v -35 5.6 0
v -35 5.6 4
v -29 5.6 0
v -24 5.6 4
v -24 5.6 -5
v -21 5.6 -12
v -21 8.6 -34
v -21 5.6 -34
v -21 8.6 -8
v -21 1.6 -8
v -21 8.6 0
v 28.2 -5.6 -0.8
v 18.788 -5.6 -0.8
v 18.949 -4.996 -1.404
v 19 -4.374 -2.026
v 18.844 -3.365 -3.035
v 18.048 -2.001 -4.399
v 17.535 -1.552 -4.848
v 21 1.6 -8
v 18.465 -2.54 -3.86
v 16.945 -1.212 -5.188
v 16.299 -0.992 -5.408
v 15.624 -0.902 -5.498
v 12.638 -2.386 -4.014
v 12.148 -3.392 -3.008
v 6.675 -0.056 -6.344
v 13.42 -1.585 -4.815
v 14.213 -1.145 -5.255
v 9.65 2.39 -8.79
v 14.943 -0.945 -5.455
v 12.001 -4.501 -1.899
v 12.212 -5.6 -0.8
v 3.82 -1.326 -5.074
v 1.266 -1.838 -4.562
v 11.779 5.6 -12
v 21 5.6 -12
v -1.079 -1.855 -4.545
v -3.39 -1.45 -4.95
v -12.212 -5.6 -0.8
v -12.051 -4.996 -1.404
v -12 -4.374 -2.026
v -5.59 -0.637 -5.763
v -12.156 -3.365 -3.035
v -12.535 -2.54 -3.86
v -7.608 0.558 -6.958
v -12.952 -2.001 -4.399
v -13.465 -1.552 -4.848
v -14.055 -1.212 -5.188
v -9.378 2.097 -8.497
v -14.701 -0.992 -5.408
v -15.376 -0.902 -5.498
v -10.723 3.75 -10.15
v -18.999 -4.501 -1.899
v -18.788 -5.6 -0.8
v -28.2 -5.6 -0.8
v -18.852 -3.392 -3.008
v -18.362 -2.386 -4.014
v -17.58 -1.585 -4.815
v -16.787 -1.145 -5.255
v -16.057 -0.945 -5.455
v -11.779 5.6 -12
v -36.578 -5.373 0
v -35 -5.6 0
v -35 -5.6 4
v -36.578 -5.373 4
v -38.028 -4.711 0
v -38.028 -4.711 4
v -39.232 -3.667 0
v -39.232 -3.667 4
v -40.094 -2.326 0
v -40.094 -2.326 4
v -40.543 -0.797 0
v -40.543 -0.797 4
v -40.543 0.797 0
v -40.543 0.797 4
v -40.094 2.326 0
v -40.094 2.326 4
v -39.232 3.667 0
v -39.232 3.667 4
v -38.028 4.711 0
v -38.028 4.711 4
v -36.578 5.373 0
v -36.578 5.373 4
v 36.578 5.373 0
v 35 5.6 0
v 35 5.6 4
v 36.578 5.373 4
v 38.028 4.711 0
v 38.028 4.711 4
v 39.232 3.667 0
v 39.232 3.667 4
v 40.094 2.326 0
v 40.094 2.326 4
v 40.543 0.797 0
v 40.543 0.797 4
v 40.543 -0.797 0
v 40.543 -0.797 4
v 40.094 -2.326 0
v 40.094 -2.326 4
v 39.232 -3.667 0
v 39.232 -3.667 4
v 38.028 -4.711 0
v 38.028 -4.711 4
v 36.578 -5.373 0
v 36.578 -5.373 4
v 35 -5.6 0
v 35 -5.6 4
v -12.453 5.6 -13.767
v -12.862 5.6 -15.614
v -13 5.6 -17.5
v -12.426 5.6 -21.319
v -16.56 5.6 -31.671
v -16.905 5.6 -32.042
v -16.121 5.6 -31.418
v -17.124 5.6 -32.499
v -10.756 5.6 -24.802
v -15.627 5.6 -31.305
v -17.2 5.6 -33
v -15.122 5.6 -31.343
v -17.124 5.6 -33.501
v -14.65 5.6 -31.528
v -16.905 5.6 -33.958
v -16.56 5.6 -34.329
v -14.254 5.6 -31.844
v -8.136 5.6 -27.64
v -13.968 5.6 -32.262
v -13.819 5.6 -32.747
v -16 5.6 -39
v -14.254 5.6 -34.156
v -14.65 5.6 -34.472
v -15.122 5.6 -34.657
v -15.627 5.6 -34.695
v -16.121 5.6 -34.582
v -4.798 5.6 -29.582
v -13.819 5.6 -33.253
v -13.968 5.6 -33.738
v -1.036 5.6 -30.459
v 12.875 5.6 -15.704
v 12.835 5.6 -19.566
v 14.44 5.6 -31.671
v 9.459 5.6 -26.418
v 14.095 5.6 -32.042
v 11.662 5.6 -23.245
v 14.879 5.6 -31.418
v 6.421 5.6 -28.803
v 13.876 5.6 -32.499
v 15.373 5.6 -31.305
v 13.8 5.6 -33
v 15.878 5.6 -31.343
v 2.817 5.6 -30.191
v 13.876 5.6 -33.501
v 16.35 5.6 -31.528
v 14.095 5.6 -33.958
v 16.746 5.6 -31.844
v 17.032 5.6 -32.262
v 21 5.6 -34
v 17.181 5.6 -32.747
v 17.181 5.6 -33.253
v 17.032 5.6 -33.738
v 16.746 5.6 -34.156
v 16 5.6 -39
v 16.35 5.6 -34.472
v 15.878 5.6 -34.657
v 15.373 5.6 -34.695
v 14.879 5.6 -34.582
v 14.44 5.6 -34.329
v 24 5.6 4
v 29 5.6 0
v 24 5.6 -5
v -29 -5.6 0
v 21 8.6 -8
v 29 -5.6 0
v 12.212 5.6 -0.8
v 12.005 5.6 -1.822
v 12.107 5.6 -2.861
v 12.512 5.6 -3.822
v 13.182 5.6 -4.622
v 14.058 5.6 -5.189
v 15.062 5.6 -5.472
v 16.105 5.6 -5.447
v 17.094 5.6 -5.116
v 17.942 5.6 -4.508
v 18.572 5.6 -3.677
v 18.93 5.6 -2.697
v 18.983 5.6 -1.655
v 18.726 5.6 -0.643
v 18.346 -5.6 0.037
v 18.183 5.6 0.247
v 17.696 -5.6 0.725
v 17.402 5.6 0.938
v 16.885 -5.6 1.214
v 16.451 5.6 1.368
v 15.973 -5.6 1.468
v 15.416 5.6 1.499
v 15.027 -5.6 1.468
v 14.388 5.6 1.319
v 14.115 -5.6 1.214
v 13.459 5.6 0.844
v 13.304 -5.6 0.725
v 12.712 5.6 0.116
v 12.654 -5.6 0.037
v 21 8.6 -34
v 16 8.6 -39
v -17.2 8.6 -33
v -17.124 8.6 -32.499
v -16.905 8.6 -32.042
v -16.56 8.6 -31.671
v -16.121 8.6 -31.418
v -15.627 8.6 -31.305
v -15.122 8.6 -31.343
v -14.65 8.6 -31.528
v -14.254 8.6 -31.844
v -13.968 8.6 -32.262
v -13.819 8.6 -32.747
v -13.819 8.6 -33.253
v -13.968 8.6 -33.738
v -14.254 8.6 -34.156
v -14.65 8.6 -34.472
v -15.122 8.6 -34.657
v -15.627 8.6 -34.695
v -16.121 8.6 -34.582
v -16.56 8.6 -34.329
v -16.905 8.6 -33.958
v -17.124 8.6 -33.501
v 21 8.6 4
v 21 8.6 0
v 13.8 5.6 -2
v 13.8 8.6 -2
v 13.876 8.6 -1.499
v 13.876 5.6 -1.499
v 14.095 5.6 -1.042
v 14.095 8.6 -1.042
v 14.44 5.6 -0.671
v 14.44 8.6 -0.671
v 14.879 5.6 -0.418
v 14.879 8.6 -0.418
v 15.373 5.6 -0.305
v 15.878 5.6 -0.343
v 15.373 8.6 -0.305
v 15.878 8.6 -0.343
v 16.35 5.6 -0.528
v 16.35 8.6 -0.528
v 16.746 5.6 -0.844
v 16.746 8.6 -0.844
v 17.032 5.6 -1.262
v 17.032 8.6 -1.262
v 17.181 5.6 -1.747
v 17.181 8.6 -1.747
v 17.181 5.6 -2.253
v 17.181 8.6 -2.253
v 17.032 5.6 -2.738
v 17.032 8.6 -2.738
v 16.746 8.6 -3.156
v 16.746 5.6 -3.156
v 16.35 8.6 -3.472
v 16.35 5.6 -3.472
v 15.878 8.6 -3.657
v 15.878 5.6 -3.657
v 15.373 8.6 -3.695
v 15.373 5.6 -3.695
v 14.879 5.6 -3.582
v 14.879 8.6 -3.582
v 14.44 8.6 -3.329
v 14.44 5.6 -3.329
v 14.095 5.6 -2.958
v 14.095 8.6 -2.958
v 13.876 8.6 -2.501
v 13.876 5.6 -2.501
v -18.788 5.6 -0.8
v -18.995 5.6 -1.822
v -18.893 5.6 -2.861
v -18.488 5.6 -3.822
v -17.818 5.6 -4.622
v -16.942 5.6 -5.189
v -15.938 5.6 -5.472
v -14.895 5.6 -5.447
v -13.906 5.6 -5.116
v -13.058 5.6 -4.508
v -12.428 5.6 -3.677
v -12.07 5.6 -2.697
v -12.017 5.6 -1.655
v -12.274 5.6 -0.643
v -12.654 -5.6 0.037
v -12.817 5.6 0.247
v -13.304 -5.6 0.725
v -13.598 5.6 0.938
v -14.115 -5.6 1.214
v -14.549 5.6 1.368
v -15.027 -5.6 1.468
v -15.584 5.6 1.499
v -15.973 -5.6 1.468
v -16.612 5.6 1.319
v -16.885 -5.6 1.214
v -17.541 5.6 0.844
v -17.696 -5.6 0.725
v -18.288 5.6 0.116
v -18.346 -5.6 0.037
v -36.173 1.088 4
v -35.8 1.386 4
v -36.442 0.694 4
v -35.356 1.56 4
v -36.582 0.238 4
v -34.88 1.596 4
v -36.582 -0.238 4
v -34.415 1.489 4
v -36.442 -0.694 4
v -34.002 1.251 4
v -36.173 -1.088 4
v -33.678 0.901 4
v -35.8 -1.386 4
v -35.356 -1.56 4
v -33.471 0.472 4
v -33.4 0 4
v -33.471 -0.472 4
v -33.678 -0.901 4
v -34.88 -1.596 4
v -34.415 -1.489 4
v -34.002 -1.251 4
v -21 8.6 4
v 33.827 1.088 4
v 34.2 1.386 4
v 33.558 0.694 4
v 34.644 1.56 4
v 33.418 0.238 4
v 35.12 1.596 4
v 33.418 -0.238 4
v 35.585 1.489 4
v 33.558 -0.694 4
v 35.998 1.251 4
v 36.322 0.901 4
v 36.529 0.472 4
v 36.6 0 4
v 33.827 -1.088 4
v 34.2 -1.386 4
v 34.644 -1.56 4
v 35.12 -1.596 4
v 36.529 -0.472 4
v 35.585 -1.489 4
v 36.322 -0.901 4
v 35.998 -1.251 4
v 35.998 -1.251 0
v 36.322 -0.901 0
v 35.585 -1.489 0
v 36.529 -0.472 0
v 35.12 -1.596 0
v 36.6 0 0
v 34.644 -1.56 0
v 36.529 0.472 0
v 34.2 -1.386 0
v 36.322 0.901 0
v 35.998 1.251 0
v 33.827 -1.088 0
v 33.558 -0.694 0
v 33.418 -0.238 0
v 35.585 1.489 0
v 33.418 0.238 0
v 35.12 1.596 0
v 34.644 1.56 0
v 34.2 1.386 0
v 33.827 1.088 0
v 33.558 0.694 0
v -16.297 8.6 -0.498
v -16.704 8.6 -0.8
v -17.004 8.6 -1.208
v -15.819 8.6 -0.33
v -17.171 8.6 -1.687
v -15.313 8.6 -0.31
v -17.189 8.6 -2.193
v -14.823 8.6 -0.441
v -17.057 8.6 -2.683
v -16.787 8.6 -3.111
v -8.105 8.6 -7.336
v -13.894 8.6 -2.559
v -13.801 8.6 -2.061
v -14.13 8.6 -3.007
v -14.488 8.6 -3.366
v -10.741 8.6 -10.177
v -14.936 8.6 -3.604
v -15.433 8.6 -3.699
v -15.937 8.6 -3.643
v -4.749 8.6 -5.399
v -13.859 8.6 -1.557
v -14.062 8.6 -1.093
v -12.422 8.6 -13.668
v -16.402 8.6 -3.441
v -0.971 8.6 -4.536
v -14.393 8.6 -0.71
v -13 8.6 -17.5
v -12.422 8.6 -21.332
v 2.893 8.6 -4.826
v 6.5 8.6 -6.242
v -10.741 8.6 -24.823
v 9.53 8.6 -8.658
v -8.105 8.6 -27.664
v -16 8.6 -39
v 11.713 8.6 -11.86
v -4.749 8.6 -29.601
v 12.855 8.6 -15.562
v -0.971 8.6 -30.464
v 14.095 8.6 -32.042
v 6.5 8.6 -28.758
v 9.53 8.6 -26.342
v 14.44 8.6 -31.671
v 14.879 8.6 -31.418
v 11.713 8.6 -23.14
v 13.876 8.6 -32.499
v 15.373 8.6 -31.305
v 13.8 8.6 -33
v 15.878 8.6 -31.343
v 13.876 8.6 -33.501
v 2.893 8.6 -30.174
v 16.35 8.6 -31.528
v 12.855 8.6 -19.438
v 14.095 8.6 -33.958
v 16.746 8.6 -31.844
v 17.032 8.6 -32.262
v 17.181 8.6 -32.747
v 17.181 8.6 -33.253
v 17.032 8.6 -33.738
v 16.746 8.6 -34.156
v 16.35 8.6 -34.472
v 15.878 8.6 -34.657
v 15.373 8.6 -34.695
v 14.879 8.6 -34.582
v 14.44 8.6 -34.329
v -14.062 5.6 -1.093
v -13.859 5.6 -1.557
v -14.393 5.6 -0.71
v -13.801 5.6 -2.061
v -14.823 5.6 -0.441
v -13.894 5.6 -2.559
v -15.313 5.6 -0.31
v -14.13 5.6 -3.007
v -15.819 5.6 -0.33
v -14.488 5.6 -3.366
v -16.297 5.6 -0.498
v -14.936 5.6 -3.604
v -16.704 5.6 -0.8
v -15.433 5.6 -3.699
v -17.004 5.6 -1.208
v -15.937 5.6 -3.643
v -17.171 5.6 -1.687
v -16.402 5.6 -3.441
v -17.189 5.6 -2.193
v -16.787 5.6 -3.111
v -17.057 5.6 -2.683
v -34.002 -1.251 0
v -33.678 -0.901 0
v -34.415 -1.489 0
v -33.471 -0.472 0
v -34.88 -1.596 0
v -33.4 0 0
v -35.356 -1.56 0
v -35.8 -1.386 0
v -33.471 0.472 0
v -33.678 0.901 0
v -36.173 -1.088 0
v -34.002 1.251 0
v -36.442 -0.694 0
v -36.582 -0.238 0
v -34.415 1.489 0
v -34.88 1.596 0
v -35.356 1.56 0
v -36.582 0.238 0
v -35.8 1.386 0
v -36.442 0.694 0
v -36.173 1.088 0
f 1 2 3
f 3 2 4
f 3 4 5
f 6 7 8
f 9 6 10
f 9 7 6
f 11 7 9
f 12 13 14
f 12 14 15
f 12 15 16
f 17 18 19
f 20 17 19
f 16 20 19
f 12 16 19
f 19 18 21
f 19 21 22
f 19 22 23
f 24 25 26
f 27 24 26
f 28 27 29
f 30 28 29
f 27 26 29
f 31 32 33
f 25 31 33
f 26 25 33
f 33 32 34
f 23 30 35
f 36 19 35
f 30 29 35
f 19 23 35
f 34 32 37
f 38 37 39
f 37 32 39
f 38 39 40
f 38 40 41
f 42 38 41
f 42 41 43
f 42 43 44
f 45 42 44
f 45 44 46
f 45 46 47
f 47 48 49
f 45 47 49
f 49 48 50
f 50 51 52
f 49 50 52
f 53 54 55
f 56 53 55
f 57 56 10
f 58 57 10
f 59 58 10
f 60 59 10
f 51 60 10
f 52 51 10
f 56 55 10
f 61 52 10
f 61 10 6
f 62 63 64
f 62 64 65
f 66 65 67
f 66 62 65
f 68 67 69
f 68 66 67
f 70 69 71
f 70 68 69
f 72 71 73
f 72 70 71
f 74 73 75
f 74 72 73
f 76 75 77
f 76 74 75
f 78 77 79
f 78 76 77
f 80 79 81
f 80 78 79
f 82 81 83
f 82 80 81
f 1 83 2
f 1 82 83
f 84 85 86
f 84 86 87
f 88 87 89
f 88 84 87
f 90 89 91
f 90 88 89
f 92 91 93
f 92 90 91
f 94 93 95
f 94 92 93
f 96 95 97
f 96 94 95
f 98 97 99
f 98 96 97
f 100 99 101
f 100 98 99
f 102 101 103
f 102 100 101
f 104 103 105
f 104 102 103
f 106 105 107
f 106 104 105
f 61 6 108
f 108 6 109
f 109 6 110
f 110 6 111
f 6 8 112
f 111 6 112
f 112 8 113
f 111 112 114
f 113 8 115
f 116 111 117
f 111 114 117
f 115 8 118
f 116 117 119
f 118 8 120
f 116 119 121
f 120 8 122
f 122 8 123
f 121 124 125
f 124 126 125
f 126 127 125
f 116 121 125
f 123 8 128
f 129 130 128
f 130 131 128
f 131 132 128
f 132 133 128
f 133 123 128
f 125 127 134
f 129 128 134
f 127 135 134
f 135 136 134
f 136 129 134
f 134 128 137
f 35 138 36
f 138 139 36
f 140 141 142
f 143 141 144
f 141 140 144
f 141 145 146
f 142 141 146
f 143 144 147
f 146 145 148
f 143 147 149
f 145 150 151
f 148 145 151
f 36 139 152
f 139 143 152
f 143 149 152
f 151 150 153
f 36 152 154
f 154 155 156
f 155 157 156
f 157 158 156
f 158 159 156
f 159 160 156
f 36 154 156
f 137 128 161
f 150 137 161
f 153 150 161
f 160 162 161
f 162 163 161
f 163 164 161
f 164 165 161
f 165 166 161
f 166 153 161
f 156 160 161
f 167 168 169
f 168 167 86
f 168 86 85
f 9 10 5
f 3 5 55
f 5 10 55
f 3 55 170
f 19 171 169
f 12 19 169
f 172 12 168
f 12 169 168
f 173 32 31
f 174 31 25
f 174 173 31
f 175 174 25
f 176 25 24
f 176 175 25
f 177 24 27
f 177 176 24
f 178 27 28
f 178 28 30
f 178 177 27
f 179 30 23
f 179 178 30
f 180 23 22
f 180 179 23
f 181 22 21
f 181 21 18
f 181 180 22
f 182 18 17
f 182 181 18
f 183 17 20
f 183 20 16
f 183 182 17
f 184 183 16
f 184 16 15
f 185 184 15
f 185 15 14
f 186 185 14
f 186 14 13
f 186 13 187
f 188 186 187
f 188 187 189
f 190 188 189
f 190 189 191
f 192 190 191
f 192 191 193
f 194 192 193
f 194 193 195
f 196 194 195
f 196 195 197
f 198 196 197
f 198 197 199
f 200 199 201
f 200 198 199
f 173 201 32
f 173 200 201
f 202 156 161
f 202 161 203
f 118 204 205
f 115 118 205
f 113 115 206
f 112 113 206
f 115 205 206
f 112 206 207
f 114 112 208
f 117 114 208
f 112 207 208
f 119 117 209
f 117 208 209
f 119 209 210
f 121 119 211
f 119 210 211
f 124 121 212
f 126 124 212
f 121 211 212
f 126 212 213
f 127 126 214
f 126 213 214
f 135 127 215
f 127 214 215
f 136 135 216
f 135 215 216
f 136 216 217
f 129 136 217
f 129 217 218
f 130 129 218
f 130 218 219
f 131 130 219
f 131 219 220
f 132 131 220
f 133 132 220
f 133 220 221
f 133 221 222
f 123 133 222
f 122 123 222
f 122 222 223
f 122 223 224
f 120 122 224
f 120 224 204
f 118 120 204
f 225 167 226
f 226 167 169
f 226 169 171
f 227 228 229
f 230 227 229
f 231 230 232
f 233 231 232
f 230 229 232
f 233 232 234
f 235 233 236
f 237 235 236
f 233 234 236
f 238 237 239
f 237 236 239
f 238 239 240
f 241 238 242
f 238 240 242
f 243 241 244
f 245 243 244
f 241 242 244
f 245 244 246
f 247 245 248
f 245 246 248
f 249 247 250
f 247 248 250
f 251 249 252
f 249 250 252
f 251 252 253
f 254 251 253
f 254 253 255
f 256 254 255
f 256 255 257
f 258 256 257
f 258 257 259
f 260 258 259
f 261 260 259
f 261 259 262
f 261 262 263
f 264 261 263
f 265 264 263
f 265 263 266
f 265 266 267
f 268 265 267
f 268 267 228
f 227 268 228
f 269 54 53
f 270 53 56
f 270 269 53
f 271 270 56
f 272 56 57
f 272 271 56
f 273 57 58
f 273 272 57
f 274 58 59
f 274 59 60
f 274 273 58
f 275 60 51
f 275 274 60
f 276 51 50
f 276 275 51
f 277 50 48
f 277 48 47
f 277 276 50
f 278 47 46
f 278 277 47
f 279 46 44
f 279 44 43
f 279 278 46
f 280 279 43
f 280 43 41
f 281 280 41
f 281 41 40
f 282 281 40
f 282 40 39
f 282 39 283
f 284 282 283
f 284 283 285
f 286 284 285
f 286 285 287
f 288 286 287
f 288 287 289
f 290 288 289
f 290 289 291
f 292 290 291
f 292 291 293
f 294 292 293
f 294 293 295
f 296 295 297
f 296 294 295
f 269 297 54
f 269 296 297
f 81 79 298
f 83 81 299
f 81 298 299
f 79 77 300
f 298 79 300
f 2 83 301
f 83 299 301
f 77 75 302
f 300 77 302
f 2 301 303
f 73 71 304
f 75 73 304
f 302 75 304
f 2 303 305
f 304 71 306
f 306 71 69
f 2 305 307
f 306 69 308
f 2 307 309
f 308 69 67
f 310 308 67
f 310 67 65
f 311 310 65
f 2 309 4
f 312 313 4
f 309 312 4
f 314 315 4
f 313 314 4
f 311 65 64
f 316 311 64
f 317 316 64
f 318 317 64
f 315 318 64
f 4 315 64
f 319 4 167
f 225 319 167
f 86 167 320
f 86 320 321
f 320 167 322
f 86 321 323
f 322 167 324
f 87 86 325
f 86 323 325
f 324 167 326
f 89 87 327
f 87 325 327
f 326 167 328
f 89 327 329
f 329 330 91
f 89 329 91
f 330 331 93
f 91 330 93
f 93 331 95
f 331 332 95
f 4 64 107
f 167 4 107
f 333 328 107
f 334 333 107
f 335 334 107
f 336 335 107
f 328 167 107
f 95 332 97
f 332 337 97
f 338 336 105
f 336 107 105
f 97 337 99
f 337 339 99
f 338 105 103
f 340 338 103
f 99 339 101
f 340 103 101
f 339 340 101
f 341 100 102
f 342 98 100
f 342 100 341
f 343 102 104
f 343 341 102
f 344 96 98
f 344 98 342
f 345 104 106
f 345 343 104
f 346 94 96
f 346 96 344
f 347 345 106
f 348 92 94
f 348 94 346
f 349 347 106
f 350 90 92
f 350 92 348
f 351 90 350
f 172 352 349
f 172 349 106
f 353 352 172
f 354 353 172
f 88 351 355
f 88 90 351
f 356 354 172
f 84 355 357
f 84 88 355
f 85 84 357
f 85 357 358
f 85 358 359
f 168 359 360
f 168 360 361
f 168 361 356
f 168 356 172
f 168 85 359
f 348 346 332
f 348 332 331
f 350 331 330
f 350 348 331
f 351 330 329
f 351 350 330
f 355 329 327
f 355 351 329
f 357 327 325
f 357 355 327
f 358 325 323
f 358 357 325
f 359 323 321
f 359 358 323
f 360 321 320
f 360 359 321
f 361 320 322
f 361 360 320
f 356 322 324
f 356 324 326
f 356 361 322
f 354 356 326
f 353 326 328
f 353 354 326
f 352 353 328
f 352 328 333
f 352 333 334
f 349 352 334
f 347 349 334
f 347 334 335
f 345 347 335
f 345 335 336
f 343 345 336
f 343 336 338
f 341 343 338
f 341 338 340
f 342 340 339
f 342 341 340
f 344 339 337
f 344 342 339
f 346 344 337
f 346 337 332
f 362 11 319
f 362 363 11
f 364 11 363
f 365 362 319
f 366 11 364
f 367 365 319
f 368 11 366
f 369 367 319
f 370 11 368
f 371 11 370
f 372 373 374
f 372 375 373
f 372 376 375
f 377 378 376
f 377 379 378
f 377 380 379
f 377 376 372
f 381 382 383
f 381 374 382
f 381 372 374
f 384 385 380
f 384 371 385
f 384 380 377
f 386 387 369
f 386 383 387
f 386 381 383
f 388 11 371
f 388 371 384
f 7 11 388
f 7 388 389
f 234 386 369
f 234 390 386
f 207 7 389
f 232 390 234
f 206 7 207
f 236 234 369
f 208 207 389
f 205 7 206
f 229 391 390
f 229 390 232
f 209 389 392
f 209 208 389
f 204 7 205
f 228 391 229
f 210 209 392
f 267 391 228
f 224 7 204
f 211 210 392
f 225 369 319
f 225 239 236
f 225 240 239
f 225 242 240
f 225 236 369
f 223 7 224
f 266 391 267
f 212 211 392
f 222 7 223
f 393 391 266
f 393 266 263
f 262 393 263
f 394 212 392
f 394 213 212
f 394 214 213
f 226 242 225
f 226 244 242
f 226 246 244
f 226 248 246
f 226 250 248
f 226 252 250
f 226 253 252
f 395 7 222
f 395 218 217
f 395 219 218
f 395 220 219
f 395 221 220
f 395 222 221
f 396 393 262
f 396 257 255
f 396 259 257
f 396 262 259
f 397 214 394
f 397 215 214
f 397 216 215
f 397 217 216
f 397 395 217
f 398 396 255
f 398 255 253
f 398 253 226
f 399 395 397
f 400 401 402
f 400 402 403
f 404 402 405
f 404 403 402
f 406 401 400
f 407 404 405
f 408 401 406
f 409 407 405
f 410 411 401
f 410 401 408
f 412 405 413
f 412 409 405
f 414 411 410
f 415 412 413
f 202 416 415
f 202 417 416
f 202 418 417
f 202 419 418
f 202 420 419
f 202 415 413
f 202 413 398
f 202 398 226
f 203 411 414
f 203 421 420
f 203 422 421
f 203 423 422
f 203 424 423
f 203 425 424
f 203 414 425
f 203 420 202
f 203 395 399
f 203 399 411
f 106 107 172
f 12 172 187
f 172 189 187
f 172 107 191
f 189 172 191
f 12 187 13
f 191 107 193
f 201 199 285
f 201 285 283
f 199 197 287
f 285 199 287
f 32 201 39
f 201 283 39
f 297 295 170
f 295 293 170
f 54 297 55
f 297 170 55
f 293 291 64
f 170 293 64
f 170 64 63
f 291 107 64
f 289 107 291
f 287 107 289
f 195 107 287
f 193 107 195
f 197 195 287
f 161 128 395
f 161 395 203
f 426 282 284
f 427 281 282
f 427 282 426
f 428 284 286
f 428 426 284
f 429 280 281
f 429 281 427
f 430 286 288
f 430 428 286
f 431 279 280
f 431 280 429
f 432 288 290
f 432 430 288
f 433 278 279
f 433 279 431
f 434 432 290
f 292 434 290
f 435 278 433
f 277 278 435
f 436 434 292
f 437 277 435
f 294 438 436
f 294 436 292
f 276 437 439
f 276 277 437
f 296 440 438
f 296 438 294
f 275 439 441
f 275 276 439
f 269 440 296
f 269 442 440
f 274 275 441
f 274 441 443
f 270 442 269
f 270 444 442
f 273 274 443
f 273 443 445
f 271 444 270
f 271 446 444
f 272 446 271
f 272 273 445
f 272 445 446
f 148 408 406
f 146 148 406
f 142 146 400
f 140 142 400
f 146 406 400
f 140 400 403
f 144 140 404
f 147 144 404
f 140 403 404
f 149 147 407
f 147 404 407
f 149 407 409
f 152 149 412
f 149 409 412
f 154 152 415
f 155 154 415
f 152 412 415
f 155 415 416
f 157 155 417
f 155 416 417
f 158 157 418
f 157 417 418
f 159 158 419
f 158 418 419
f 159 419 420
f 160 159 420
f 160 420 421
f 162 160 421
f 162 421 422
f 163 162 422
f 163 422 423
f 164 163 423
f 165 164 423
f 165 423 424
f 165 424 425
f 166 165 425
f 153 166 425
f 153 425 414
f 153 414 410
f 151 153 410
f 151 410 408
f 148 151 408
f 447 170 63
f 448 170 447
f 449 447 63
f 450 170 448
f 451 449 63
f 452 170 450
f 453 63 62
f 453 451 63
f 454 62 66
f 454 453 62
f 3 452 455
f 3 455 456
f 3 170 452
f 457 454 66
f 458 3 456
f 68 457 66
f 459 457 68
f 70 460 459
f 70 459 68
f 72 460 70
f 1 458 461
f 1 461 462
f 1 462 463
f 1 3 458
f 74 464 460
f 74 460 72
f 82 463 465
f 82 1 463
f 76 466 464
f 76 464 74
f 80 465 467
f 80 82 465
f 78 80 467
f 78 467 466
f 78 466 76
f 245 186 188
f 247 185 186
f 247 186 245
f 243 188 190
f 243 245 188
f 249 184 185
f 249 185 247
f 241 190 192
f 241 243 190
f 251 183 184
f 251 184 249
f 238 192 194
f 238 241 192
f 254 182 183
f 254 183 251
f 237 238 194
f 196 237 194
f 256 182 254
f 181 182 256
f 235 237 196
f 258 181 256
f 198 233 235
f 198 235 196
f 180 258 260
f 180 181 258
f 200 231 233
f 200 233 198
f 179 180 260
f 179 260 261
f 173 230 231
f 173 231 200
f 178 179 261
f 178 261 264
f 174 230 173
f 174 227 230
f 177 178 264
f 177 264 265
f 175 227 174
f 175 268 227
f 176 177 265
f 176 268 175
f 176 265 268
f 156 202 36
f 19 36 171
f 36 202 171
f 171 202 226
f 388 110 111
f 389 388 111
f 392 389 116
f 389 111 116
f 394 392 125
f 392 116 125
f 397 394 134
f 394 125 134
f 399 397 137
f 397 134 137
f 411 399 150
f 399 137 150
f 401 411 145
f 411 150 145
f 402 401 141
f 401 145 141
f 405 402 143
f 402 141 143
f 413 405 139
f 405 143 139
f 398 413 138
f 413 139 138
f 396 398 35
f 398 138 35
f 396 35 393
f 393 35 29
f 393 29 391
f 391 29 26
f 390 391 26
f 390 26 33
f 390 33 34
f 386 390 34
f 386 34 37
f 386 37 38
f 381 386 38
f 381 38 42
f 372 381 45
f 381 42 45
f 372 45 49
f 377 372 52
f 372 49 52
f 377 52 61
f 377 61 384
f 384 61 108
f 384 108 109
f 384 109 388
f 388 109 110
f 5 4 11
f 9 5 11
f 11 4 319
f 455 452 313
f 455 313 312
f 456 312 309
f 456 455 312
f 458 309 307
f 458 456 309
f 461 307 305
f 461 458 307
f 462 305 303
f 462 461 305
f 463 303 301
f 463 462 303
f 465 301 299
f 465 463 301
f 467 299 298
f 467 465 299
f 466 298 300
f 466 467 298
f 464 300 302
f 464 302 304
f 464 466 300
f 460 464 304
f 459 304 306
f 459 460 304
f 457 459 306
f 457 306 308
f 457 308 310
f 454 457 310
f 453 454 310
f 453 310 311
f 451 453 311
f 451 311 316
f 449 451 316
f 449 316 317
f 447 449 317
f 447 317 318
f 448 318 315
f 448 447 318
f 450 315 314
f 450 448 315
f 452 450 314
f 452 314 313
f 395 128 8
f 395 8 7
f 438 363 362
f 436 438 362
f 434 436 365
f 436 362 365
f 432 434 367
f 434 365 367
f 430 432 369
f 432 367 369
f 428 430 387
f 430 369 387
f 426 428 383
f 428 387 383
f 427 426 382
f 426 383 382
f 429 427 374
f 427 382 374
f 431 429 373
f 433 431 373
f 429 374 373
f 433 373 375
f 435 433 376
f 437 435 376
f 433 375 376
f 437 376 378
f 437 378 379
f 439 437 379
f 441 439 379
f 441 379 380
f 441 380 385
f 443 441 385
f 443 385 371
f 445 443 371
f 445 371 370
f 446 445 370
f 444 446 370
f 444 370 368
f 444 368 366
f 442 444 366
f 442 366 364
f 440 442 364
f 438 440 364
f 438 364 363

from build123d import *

# Parameters (mm, degrees)
ESBO_O1_R                = 1.6
RESSALTO_EXTRUS_O1_DEPTH = 4
ESBO_O2_W                = 42
ESBO_O2_H                = 43
ESBO_O2_R                = 13
RESSALTO_EXTRUS_O2_DEPTH = 3
CHANFRO1_SIZE            = 3
CHANFRO2_SIZE            = 5
CHANFRO3_SIZE            = 12
ESBO_O3_R                = 1.7
CORTE_EXTRUS_O1_DEPTH    = 59.060313468
ESBO_O4_R                = 3.5
CORTE_EXTRUS_O2_DEPTH    = 58.400348431
CHANFRO4_SIZE            = 8


# Some blends are built 0.0001 mm under size
with BuildPart() as part:
    # Esboço1 → Ressalto-extrusão1 (new body)
    with BuildSketch(Plane.XY):
        with BuildLine():
            Line((-35, 5.6), (35, 5.6))
            ThreePointArc((35, 5.6), (40.6, 0), (35, -5.6))
            Line((35, -5.6), (-35, -5.6))
            ThreePointArc((-35, -5.6), (-40.6, 0), (-35, 5.6))
        make_face()
        with Locations((35, 0)):
            Circle(ESBO_O1_R, mode=Mode.SUBTRACT)
        with Locations((-35, 0)):
            Circle(ESBO_O1_R, mode=Mode.SUBTRACT)
    extrude(amount=RESSALTO_EXTRUS_O1_DEPTH)

    # Esboço2 → Ressalto-extrusão2 (add)
    with BuildSketch(Plane(origin=(0, 5.6, 0), x_dir=(1, 0, 0), z_dir=(0, 1, 0))):
        with Locations((0, 17.5)):
            Rectangle(ESBO_O2_W, ESBO_O2_H)
        with Locations(Location((0, 17.5, 0), (0, 0, 180))):
            Circle(ESBO_O2_R, mode=Mode.SUBTRACT)
    extrude(amount=RESSALTO_EXTRUS_O2_DEPTH)

    # Chanfro1
    chanfro1_edges = [part.edges().sort_by_distance(p)[0] for p in [
        (21, 5.6, 2),
        (-21, 5.6, 2),
    ]]
    chamfer(chanfro1_edges, length=CHANFRO1_SIZE - 0.0001)  # a hair under: the kernel refuses the full size

    # Chanfro2
    chanfro2_edges = [part.edges().sort_by_distance(p)[0] for p in [
        (21, 7.1, -39),
        (-21, 7.1, -39),
    ]]
    chamfer(chanfro2_edges, length=CHANFRO2_SIZE)

    # Chanfro3
    # the kernel refuses this chamfer: 12 mm, written as the material it adds along each edge
    with BuildSketch(Plane(origin=(-21, 5.6, 0), x_dir=(0, 0.027495876610586417, -0.9996219169112968), z_dir=(1, 0, 0))) as chanfro3_piece_1_section:
        Polygon((CHANFRO3_SIZE * 0.999621916911, -CHANFRO3_SIZE * 0.0274958766106), (-CHANFRO3_SIZE * 0.0274958766106, -CHANFRO3_SIZE * 0.999621916911), (0, 0), align=None)
    chanfro3_piece_1 = extrude(amount=42, mode=Mode.PRIVATE)
    chanfro3_piece_1 = chanfro3_piece_1 - Plane(origin=(0, 1.3654596, -17.5), x_dir=(-1, 0, 0), z_dir=(0, -1, 0)) * Cylinder(13, 132, mode=Mode.PRIVATE)
    chanfro3_piece_1 = split(chanfro3_piece_1, bisect_by=Plane(origin=(0, -5.6, -3.473436689), z_dir=(0, 1, 0)), keep=Keep.TOP, mode=Mode.PRIVATE)
    add(chanfro3_piece_1)

    # Esboço3 → Corte-extrusão1 (cut, through all)
    with BuildSketch(Plane(origin=(0, 8.6, 0), x_dir=(1, 0, 0), z_dir=(0, 1, 0))):
        with Locations(Location((-15.5, 33, 0), (0, 0, 180))):
            Circle(ESBO_O3_R)
        with Locations(Location((15.5, 33, 0), (0, 0, 180))):
            Circle(ESBO_O3_R)
        with Locations(Location((15.5, 2, 0), (0, 0, 180))):
            Circle(ESBO_O3_R)
        with Locations(Location((-15.5, 2, 0), (0, 0, 224.900872156))):
            Circle(ESBO_O3_R)
    extrude(amount=-CORTE_EXTRUS_O1_DEPTH, mode=Mode.SUBTRACT)

    # Esboço4 → Corte-extrusão2 (cut, through all)
    with BuildSketch(Plane.XZ.offset(-5.6)):
        with Locations(Location((-15.5, -2, 0), (0, 0, 159.948957433))):
            Circle(ESBO_O4_R)
        with Locations(Location((15.5, -2, 0), (0, 0, 159.948957433))):
            Circle(ESBO_O4_R)
        with Locations((15.5, -33)):
            Circle(ESBO_O4_R)
        with Locations((-15.5, -33)):
            Circle(ESBO_O4_R)
    extrude(amount=CORTE_EXTRUS_O2_DEPTH, mode=Mode.SUBTRACT)

    # Chanfro4
    # the kernel refuses this chamfer: 8 mm, written as the material it adds along each edge
    with BuildSketch(Plane(origin=(21, 29.173363904, 0), x_dir=(-0.027495876610586494, 3.1525903256593395e-13, -0.9996219169112968), z_dir=(0, -1, 0))) as chanfro4_piece_1_section:
        Polygon((CHANFRO4_SIZE * 0.999621916911, CHANFRO4_SIZE * 0.0274958766106), (-CHANFRO4_SIZE * 0.0274958766106, CHANFRO4_SIZE * 0.999621916911), (0, 0), align=None)
    chanfro4_piece_1 = extrude(amount=34.773363904, mode=Mode.PRIVATE)
    chanfro4_piece_1 = split(chanfro4_piece_1, bisect_by=Plane(origin=(26.011530684, 3.588369316, -1.04435595), z_dir=(0.7071067811865474, 0.7071067811865478, 0)), keep=Keep.TOP, mode=Mode.PRIVATE)
    chanfro4_piece_1 = split(chanfro4_piece_1, bisect_by=Plane(origin=(26.682074245, 5.6, -1.04435595), z_dir=(0, -1, 0)), keep=Keep.TOP, mode=Mode.PRIVATE)
    add(chanfro4_piece_1)
    with BuildSketch(Plane(origin=(21, 29.173363904, 0), x_dir=(-0.027495876610586494, 3.1525903256593395e-13, -0.9996219169112968), z_dir=(0, -1, 0))) as chanfro4_piece_2_section:
        Polygon((CHANFRO4_SIZE * 0.999621916911, CHANFRO4_SIZE * 0.0274958766106), (-CHANFRO4_SIZE * 0.0274958766106, CHANFRO4_SIZE * 0.999621916911), (0, 0), align=None)
    chanfro4_piece_2 = extrude(amount=34.773363904, mode=Mode.PRIVATE)
    chanfro4_piece_2 = split(chanfro4_piece_2, bisect_by=Plane(origin=(22.348256975, 7.251643025, -3.639481653), z_dir=(-0.7071067811865474, -0.7071067811865478, 0)), keep=Keep.TOP, mode=Mode.PRIVATE)
    chanfro4_piece_2 = split(chanfro4_piece_2, bisect_by=Plane(origin=(21.792799579, 8.6, -3.639481653), z_dir=(0, -1, 0)), keep=Keep.TOP, mode=Mode.PRIVATE)
    chanfro4_piece_2 = split(chanfro4_piece_2, bisect_by=Plane(origin=(21.792799579, 5.6, -3.639481653), z_dir=(0, 1, 0)), keep=Keep.TOP, mode=Mode.PRIVATE)
    add(chanfro4_piece_2)
    with BuildSketch(Plane(origin=(21, 29.173363904, 0), x_dir=(-0.027495876610586494, 3.1525903256593395e-13, -0.9996219169112968), z_dir=(0, -1, 0))) as chanfro4_piece_3_section:
        Polygon((CHANFRO4_SIZE * 0.999621916911, CHANFRO4_SIZE * 0.0274958766106), (-CHANFRO4_SIZE * 0.0274958766106, CHANFRO4_SIZE * 0.999621916911), (0, 0), align=None)
    chanfro4_piece_3 = extrude(amount=34.773363904, mode=Mode.PRIVATE)
    chanfro4_piece_3 = split(chanfro4_piece_3, bisect_by=Plane(origin=(23.6247191, -1.786159604, -4.613840396), z_dir=(0, 0.7071067811862648, 0.7071067811868302)), keep=Keep.TOP, mode=Mode.PRIVATE)
    chanfro4_piece_3 = split(chanfro4_piece_3, bisect_by=Plane(origin=(26.361426714, 3.238473286, -2.325915119), z_dir=(-0.7071067811865474, -0.7071067811865478, 0)), keep=Keep.TOP, mode=Mode.PRIVATE)
    chanfro4_piece_3 = split(chanfro4_piece_3, bisect_by=Plane(origin=(23.6247191, 5.6, -2.325915119), z_dir=(0, -1, 0)), keep=Keep.TOP, mode=Mode.PRIVATE)
    add(chanfro4_piece_3)
    with BuildSketch(Plane(origin=(-21, -5.6, 0), x_dir=(0.027495876610578507, 3.1525903256593415e-13, -0.999621916911297), z_dir=(0, 1, 0))) as chanfro4_piece_4_section:
        Polygon((CHANFRO4_SIZE * 0.999621916911, CHANFRO4_SIZE * 0.0274958766106), (-CHANFRO4_SIZE * 0.0274958766111, CHANFRO4_SIZE * 0.999621916911), (0, 0), align=None)
    chanfro4_piece_4 = extrude(amount=34.773363904, mode=Mode.PRIVATE)
    chanfro4_piece_4 = split(chanfro4_piece_4, bisect_by=Plane(origin=(-23.6247191, -1.786159604, -4.613840396), z_dir=(0, 0.7071067811862648, 0.7071067811868302)), keep=Keep.TOP, mode=Mode.PRIVATE)
    chanfro4_piece_4 = split(chanfro4_piece_4, bisect_by=Plane(origin=(-26.361426714, 3.238473286, -2.325915119), z_dir=(0.7071067811865477, -0.7071067811865475, 0)), keep=Keep.TOP, mode=Mode.PRIVATE)
    chanfro4_piece_4 = split(chanfro4_piece_4, bisect_by=Plane(origin=(-23.6247191, 5.6, -2.325915119), z_dir=(0, -1, 0)), keep=Keep.TOP, mode=Mode.PRIVATE)
    add(chanfro4_piece_4)
    with BuildSketch(Plane(origin=(-21, -5.6, 0), x_dir=(0.027495876610578507, 3.1525903256593415e-13, -0.999621916911297), z_dir=(0, 1, 0))) as chanfro4_piece_5_section:
        Polygon((CHANFRO4_SIZE * 0.999621916911, CHANFRO4_SIZE * 0.0274958766106), (-CHANFRO4_SIZE * 0.0274958766111, CHANFRO4_SIZE * 0.999621916911), (0, 0), align=None)
    chanfro4_piece_5 = extrude(amount=34.773363904, mode=Mode.PRIVATE)
    chanfro4_piece_5 = split(chanfro4_piece_5, bisect_by=Plane(origin=(-26.011530684, 3.588369316, -1.04435595), z_dir=(-0.7071067811865477, 0.7071067811865475, 0)), keep=Keep.TOP, mode=Mode.PRIVATE)
    chanfro4_piece_5 = split(chanfro4_piece_5, bisect_by=Plane(origin=(-26.682074245, 5.6, -1.04435595), z_dir=(0, -1, 0)), keep=Keep.TOP, mode=Mode.PRIVATE)
    add(chanfro4_piece_5)
    with BuildSketch(Plane(origin=(-21, -5.6, 0), x_dir=(0.027495876610578507, 3.1525903256593415e-13, -0.999621916911297), z_dir=(0, 1, 0))) as chanfro4_piece_6_section:
        Polygon((CHANFRO4_SIZE * 0.999621916911, CHANFRO4_SIZE * 0.0274958766106), (-CHANFRO4_SIZE * 0.0274958766111, CHANFRO4_SIZE * 0.999621916911), (0, 0), align=None)
    chanfro4_piece_6 = extrude(amount=34.773363904, mode=Mode.PRIVATE)
    chanfro4_piece_6 = split(chanfro4_piece_6, bisect_by=Plane(origin=(-22.348256975, 7.251643025, -3.639481653), z_dir=(0.7071067811865477, -0.7071067811865475, 0)), keep=Keep.TOP, mode=Mode.PRIVATE)
    chanfro4_piece_6 = split(chanfro4_piece_6, bisect_by=Plane(origin=(-21.792799579, 8.6, -3.639481653), z_dir=(0, -1, 0)), keep=Keep.TOP, mode=Mode.PRIVATE)
    chanfro4_piece_6 = split(chanfro4_piece_6, bisect_by=Plane(origin=(-21.792799579, 5.6, -3.639481653), z_dir=(0, 1, 0)), keep=Keep.TOP, mode=Mode.PRIVATE)
    add(chanfro4_piece_6)


solid = part.part
